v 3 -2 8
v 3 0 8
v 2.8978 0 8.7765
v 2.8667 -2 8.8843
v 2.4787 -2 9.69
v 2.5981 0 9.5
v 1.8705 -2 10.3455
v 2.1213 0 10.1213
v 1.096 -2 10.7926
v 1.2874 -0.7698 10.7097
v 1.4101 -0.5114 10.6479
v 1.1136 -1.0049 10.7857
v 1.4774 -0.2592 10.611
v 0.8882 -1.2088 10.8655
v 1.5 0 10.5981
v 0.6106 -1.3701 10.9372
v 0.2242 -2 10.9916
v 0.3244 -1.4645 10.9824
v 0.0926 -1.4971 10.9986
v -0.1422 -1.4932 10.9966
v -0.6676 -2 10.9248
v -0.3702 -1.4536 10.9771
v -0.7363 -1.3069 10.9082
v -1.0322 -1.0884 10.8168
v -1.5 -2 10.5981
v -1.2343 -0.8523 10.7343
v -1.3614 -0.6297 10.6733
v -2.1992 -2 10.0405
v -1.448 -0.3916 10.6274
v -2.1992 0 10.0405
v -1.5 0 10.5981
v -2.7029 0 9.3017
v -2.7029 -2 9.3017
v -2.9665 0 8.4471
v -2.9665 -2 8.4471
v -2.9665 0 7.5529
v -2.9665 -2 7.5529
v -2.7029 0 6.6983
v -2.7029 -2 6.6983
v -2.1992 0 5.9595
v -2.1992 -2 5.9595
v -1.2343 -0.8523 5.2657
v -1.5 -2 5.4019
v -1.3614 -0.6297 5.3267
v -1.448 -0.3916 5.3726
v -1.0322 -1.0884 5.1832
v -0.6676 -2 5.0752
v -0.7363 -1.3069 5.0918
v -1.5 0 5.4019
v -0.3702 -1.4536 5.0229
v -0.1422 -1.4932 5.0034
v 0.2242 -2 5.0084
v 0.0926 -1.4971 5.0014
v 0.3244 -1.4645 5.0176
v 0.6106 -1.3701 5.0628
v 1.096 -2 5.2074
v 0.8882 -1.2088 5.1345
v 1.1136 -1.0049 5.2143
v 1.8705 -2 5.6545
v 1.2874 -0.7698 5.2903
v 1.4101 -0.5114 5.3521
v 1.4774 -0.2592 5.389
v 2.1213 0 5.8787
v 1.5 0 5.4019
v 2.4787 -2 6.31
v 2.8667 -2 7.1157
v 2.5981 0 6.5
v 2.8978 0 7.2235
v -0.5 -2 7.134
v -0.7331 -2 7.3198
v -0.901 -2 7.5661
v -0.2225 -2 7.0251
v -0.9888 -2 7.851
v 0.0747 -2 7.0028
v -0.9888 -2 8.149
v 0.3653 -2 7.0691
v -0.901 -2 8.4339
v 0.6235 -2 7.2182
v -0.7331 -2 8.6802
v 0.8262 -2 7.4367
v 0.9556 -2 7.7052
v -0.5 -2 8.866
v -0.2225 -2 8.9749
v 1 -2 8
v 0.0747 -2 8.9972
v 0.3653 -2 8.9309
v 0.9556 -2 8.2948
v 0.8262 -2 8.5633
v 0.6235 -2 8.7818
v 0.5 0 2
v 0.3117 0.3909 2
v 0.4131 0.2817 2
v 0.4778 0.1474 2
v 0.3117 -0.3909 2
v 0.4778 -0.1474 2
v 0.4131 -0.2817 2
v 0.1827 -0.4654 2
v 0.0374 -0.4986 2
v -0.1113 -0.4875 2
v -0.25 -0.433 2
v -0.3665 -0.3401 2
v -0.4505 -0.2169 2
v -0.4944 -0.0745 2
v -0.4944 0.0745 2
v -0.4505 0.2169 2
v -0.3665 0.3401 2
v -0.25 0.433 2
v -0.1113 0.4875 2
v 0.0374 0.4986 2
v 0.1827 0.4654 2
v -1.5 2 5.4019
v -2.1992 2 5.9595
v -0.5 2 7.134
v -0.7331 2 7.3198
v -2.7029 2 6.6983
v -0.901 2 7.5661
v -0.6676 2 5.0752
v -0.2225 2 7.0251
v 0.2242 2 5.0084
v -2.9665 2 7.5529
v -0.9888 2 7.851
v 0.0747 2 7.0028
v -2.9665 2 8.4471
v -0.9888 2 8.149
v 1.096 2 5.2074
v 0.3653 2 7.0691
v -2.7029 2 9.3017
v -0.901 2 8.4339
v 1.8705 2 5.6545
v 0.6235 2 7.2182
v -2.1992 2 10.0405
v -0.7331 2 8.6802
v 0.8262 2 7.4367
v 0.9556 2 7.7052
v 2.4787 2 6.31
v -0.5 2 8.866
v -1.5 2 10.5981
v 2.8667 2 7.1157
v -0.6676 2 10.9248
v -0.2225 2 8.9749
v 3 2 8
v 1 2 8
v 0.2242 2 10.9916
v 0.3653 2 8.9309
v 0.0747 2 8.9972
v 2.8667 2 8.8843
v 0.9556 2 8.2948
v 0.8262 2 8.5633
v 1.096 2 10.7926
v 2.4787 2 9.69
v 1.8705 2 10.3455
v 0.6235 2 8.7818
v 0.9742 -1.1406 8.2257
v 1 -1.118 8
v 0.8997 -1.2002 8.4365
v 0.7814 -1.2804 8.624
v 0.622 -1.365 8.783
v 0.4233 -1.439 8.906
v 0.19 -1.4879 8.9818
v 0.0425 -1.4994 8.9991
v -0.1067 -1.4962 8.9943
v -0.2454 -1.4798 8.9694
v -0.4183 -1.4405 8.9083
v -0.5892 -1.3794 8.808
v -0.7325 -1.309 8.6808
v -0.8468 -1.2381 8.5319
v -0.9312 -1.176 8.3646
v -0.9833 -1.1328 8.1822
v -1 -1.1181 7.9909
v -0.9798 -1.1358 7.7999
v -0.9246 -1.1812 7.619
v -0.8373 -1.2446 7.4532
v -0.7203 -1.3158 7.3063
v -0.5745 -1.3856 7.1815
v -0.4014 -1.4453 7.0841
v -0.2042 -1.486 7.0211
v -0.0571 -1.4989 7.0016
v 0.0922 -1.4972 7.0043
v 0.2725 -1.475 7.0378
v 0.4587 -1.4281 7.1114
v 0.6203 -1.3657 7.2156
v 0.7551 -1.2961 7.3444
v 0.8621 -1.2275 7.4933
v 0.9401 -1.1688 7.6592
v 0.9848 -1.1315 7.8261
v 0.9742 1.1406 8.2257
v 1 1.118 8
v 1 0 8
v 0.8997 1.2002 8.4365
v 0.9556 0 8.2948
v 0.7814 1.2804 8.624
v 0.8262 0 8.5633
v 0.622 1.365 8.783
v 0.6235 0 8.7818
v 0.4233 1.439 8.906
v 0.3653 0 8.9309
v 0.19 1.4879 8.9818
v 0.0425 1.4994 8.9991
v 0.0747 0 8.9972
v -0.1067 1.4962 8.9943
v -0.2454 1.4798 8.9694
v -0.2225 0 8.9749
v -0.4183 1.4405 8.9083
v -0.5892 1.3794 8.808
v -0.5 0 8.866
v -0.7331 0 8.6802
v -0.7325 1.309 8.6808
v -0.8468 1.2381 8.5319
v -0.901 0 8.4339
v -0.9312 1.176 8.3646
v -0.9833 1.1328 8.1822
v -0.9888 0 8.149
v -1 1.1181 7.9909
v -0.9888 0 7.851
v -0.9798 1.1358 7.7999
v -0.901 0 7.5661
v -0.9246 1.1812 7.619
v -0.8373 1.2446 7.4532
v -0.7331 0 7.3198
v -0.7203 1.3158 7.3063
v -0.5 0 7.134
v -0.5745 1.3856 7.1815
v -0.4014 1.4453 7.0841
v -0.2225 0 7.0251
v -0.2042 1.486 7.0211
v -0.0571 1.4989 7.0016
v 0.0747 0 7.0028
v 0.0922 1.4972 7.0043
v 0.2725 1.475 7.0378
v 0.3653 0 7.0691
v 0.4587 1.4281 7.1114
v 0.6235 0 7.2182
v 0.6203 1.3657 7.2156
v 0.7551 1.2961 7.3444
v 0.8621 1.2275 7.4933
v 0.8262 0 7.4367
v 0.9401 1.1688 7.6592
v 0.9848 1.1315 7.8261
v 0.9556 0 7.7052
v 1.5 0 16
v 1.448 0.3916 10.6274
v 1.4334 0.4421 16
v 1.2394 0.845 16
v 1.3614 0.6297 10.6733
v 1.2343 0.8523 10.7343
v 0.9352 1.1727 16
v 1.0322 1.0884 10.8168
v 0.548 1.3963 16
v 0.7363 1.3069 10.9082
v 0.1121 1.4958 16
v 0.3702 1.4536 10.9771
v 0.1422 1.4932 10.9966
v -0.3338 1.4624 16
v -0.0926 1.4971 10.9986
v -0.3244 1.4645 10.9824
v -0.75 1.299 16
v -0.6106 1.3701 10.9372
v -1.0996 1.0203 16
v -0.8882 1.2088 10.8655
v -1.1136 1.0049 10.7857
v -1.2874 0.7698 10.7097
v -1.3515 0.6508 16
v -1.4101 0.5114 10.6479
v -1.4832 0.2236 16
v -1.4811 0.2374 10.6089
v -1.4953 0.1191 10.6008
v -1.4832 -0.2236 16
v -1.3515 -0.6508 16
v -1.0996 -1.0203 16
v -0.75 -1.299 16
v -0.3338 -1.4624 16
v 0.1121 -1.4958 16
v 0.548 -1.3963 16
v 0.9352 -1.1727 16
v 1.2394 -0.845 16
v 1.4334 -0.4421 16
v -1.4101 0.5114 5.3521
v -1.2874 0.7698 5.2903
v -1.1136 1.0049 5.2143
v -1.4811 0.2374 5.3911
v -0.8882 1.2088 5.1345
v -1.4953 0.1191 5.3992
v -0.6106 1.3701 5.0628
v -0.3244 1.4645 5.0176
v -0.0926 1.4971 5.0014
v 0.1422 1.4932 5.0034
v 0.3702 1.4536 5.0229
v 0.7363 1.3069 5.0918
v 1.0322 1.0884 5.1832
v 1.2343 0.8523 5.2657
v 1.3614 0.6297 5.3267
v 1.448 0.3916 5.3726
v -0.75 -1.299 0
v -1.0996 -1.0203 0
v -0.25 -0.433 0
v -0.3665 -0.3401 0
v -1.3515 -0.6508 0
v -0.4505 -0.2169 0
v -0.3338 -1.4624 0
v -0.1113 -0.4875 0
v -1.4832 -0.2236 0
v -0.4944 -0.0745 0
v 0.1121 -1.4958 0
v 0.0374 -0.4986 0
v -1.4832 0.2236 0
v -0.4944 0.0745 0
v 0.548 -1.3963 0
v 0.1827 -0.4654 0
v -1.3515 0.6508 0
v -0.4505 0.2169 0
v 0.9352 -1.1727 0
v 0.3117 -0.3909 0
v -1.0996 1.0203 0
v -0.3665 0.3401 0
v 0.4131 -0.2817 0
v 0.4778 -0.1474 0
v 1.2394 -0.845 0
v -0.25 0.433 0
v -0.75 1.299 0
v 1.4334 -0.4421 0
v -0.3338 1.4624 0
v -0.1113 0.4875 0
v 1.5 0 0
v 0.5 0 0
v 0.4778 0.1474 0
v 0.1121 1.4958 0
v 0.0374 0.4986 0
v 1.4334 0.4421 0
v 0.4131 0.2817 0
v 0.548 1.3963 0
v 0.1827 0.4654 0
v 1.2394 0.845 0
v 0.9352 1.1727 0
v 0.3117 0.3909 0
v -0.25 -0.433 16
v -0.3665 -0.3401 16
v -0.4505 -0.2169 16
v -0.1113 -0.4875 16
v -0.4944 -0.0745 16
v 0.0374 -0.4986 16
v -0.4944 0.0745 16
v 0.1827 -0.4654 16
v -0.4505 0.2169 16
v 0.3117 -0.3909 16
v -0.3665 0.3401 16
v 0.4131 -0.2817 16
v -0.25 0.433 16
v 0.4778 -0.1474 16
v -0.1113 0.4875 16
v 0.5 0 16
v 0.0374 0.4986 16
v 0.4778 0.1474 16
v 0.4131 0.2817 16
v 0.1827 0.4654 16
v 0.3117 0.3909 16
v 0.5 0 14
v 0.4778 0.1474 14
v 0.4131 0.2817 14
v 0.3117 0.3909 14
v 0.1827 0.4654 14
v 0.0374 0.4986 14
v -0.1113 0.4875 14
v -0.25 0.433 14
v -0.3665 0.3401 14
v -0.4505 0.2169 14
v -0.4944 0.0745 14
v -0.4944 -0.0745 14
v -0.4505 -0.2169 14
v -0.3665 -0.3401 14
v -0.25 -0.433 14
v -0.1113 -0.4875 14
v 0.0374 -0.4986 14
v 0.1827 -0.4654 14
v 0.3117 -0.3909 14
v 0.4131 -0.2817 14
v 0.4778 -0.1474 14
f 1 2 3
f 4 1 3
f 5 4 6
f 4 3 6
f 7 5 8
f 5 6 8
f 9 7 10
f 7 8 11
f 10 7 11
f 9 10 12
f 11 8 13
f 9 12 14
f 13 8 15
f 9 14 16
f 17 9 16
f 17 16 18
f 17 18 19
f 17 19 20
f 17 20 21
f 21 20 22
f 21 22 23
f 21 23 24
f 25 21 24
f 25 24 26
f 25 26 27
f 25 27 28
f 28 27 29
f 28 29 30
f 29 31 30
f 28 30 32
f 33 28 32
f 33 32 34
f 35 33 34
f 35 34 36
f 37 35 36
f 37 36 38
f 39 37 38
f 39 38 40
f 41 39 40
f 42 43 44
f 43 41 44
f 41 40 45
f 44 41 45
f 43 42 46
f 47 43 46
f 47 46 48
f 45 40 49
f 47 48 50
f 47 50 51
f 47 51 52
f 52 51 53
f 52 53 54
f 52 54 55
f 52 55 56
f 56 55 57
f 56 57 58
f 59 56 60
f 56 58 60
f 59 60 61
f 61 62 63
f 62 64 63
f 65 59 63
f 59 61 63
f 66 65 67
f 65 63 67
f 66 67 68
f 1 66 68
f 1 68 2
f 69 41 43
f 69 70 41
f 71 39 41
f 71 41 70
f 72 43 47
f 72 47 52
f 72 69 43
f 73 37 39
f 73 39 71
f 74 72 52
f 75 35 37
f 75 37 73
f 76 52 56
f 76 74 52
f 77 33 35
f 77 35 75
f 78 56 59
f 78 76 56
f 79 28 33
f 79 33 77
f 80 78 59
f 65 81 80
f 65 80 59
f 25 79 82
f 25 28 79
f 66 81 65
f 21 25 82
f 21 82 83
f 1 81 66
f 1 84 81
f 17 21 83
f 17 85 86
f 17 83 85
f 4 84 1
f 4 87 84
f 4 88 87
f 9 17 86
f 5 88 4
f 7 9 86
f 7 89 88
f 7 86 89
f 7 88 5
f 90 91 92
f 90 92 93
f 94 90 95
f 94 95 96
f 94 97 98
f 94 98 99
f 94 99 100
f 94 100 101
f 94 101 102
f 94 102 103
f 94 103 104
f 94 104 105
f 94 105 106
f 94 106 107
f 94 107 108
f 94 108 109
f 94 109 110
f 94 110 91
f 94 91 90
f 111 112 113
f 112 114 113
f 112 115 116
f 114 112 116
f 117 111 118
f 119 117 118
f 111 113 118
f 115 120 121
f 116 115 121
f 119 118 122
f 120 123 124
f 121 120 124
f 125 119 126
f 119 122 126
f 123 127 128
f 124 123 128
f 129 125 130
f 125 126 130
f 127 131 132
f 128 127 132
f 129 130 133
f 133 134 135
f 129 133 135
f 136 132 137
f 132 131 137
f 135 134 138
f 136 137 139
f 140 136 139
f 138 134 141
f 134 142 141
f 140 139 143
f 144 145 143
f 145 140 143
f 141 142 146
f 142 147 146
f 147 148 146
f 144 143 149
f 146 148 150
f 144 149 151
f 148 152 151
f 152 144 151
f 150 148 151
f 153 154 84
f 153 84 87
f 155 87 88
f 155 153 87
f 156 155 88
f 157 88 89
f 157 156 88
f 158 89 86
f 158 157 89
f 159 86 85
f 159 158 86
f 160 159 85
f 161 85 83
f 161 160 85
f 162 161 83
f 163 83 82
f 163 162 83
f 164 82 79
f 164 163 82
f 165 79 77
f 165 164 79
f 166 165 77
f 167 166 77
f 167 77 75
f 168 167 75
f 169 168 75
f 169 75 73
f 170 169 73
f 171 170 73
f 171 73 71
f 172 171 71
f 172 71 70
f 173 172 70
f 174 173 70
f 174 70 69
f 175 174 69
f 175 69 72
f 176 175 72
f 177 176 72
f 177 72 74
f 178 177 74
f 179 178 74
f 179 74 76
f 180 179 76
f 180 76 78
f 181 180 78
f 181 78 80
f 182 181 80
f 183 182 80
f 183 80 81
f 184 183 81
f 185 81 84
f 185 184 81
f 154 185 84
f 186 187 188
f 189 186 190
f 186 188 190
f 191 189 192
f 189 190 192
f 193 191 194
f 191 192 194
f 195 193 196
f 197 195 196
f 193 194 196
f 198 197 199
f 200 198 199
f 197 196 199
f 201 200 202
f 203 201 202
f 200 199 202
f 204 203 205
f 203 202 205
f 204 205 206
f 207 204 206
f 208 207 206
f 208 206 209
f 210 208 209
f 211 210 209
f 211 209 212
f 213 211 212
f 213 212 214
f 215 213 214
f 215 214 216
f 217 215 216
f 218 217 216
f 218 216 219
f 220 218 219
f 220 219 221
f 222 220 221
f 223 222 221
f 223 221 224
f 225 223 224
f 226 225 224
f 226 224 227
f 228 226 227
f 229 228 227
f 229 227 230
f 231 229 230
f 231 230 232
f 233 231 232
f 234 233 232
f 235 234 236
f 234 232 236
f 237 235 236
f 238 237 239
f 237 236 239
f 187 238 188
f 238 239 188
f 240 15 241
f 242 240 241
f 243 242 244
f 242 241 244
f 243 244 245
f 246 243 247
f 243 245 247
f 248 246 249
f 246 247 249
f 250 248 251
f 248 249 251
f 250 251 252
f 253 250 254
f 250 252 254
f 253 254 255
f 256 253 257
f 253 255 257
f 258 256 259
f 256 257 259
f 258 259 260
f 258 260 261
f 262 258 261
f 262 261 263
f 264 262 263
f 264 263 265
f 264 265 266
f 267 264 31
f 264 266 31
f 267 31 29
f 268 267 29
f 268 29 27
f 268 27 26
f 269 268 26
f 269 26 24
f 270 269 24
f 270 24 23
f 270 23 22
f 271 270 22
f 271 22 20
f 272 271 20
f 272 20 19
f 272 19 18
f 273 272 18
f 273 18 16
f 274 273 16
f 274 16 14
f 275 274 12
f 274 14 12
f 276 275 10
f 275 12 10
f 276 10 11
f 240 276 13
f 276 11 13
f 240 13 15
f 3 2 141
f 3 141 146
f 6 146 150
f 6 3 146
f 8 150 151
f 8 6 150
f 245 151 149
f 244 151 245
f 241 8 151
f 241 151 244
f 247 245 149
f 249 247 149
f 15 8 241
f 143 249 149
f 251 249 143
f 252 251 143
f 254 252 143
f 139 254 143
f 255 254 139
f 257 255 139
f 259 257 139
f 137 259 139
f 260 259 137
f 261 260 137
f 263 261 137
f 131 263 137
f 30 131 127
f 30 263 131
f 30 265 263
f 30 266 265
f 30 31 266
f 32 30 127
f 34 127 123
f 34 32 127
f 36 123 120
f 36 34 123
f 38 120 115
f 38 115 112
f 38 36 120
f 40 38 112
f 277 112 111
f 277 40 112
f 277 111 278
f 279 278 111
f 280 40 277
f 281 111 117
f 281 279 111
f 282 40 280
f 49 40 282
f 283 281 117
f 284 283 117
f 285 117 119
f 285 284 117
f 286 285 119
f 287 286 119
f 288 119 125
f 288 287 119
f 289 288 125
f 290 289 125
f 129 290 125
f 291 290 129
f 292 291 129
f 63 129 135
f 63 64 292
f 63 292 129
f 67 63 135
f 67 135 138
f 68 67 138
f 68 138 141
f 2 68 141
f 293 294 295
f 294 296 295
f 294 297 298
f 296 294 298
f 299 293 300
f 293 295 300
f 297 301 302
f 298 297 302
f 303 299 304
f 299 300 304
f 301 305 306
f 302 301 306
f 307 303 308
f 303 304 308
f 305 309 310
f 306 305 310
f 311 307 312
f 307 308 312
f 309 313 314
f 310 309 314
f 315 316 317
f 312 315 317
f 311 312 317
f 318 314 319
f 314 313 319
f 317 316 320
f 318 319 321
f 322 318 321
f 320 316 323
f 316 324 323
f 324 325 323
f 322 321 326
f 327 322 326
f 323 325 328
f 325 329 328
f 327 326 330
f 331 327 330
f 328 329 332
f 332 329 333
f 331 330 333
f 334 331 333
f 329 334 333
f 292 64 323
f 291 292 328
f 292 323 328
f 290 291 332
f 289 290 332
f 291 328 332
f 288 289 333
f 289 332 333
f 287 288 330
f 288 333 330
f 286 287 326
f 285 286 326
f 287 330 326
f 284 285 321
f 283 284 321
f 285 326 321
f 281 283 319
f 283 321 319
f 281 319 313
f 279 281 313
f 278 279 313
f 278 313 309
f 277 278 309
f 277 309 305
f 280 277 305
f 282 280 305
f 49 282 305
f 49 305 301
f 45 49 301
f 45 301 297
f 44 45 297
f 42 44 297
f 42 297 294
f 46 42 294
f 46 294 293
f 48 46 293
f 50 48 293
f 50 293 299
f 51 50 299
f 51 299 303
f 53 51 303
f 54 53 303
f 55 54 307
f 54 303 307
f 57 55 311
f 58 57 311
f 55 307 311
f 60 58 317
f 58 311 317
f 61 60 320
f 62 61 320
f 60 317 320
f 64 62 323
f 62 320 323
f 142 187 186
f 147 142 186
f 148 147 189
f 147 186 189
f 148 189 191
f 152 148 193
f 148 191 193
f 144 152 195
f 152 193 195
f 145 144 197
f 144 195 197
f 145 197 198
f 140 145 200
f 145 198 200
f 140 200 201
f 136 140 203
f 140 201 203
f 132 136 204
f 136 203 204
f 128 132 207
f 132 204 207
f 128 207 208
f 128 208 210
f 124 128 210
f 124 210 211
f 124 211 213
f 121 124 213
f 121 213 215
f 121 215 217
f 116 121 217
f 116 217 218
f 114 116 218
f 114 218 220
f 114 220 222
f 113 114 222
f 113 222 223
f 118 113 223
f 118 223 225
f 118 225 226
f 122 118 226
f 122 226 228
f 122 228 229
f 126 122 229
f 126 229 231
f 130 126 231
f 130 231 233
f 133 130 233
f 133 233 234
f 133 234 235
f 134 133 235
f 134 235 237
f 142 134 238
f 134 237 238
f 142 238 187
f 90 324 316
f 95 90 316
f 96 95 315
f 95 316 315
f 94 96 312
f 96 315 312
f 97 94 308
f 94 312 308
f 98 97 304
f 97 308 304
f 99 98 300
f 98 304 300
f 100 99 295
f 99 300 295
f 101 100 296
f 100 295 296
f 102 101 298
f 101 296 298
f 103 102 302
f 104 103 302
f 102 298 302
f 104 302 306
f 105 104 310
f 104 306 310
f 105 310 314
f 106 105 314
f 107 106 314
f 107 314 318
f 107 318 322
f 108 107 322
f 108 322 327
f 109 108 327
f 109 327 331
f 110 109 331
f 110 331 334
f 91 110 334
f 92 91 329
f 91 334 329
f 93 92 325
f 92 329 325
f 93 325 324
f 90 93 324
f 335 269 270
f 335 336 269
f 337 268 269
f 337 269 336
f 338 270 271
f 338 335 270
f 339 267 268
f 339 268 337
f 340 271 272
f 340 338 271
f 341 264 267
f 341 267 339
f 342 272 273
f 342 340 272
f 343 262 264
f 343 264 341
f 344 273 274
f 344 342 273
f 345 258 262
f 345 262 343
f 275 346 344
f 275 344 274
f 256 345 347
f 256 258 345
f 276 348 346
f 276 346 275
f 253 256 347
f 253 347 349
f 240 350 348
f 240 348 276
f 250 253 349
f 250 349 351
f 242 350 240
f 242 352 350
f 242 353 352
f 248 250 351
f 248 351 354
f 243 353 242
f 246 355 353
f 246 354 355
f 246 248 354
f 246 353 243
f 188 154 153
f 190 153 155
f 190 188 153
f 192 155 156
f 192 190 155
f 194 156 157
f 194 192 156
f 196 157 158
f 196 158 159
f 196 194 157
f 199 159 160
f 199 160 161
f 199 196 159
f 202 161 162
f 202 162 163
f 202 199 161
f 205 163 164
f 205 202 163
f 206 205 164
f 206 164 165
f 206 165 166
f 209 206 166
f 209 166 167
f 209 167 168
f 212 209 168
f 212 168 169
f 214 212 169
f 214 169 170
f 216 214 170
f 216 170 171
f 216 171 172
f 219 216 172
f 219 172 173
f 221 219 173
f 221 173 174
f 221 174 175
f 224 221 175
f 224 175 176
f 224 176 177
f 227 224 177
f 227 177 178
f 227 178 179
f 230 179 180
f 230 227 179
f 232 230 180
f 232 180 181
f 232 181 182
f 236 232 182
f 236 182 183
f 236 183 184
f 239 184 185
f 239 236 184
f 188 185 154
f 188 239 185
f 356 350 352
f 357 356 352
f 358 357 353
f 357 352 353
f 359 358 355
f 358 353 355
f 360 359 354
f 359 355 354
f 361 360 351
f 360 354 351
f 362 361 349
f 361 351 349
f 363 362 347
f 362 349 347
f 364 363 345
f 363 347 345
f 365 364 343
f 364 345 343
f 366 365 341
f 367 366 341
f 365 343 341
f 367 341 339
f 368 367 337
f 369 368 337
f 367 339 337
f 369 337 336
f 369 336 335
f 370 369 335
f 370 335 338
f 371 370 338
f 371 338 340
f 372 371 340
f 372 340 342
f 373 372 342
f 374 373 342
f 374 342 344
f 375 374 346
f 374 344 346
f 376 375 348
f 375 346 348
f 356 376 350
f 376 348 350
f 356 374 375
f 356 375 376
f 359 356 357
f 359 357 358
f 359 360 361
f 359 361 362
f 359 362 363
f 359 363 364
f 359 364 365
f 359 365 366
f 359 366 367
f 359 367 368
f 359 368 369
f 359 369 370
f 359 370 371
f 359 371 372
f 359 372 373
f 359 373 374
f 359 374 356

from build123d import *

# Parameters (mm, degrees)
F0_R          = 1.5
F1_DEPTH      = 16
F2_R          = 0.5
F3_DEPTH      = 2
F4_R          = 0.5
F5_DEPTH      = 2
F6_R          = 3
F6_R_2        = 1
F7_DEPTH      = 2
F7_DEPTH_BACK = 2
F8_R          = 1
F9_DEPTH      = 2
F9_DEPTH_BACK = 2


with BuildPart() as f1:
    # F0 (on Top) → F1 (new body)
    with BuildSketch(Plane.XY):
        Circle(F0_R)
    extrude(amount=F1_DEPTH)

    # F2 (on face) → F3 (cut)
    with BuildSketch(Plane.XY.offset(16)):
        Circle(F2_R)
    extrude(amount=-F3_DEPTH, mode=Mode.SUBTRACT)

    # F4 (on face) → F5 (cut)
    with BuildSketch(Plane(origin=(0, 0, 0), x_dir=(1, 0, 0), z_dir=(0, 0, -1))):
        Circle(F4_R)
    extrude(amount=-F5_DEPTH, mode=Mode.SUBTRACT)

    # F6 (on Front) → F7 (join, two sides)
    with BuildSketch(Plane.XZ) as f7_sk:
        with Locations((0, 8)):
            Circle(F6_R)
        with Locations((0, 8)):
            Circle(F6_R_2, mode=Mode.SUBTRACT)
    extrude(amount=F7_DEPTH)
    extrude(f7_sk.sketch, amount=-F7_DEPTH_BACK)

    # F8 (on Front) → F9 (cut, two sides)
    with BuildSketch(Plane.XZ) as f9_sk:
        with Locations((0, 8)):
            Circle(F8_R)
    extrude(amount=-F9_DEPTH, mode=Mode.SUBTRACT)
    extrude(f9_sk.sketch, amount=F9_DEPTH_BACK, mode=Mode.SUBTRACT)


solid = f1.part
